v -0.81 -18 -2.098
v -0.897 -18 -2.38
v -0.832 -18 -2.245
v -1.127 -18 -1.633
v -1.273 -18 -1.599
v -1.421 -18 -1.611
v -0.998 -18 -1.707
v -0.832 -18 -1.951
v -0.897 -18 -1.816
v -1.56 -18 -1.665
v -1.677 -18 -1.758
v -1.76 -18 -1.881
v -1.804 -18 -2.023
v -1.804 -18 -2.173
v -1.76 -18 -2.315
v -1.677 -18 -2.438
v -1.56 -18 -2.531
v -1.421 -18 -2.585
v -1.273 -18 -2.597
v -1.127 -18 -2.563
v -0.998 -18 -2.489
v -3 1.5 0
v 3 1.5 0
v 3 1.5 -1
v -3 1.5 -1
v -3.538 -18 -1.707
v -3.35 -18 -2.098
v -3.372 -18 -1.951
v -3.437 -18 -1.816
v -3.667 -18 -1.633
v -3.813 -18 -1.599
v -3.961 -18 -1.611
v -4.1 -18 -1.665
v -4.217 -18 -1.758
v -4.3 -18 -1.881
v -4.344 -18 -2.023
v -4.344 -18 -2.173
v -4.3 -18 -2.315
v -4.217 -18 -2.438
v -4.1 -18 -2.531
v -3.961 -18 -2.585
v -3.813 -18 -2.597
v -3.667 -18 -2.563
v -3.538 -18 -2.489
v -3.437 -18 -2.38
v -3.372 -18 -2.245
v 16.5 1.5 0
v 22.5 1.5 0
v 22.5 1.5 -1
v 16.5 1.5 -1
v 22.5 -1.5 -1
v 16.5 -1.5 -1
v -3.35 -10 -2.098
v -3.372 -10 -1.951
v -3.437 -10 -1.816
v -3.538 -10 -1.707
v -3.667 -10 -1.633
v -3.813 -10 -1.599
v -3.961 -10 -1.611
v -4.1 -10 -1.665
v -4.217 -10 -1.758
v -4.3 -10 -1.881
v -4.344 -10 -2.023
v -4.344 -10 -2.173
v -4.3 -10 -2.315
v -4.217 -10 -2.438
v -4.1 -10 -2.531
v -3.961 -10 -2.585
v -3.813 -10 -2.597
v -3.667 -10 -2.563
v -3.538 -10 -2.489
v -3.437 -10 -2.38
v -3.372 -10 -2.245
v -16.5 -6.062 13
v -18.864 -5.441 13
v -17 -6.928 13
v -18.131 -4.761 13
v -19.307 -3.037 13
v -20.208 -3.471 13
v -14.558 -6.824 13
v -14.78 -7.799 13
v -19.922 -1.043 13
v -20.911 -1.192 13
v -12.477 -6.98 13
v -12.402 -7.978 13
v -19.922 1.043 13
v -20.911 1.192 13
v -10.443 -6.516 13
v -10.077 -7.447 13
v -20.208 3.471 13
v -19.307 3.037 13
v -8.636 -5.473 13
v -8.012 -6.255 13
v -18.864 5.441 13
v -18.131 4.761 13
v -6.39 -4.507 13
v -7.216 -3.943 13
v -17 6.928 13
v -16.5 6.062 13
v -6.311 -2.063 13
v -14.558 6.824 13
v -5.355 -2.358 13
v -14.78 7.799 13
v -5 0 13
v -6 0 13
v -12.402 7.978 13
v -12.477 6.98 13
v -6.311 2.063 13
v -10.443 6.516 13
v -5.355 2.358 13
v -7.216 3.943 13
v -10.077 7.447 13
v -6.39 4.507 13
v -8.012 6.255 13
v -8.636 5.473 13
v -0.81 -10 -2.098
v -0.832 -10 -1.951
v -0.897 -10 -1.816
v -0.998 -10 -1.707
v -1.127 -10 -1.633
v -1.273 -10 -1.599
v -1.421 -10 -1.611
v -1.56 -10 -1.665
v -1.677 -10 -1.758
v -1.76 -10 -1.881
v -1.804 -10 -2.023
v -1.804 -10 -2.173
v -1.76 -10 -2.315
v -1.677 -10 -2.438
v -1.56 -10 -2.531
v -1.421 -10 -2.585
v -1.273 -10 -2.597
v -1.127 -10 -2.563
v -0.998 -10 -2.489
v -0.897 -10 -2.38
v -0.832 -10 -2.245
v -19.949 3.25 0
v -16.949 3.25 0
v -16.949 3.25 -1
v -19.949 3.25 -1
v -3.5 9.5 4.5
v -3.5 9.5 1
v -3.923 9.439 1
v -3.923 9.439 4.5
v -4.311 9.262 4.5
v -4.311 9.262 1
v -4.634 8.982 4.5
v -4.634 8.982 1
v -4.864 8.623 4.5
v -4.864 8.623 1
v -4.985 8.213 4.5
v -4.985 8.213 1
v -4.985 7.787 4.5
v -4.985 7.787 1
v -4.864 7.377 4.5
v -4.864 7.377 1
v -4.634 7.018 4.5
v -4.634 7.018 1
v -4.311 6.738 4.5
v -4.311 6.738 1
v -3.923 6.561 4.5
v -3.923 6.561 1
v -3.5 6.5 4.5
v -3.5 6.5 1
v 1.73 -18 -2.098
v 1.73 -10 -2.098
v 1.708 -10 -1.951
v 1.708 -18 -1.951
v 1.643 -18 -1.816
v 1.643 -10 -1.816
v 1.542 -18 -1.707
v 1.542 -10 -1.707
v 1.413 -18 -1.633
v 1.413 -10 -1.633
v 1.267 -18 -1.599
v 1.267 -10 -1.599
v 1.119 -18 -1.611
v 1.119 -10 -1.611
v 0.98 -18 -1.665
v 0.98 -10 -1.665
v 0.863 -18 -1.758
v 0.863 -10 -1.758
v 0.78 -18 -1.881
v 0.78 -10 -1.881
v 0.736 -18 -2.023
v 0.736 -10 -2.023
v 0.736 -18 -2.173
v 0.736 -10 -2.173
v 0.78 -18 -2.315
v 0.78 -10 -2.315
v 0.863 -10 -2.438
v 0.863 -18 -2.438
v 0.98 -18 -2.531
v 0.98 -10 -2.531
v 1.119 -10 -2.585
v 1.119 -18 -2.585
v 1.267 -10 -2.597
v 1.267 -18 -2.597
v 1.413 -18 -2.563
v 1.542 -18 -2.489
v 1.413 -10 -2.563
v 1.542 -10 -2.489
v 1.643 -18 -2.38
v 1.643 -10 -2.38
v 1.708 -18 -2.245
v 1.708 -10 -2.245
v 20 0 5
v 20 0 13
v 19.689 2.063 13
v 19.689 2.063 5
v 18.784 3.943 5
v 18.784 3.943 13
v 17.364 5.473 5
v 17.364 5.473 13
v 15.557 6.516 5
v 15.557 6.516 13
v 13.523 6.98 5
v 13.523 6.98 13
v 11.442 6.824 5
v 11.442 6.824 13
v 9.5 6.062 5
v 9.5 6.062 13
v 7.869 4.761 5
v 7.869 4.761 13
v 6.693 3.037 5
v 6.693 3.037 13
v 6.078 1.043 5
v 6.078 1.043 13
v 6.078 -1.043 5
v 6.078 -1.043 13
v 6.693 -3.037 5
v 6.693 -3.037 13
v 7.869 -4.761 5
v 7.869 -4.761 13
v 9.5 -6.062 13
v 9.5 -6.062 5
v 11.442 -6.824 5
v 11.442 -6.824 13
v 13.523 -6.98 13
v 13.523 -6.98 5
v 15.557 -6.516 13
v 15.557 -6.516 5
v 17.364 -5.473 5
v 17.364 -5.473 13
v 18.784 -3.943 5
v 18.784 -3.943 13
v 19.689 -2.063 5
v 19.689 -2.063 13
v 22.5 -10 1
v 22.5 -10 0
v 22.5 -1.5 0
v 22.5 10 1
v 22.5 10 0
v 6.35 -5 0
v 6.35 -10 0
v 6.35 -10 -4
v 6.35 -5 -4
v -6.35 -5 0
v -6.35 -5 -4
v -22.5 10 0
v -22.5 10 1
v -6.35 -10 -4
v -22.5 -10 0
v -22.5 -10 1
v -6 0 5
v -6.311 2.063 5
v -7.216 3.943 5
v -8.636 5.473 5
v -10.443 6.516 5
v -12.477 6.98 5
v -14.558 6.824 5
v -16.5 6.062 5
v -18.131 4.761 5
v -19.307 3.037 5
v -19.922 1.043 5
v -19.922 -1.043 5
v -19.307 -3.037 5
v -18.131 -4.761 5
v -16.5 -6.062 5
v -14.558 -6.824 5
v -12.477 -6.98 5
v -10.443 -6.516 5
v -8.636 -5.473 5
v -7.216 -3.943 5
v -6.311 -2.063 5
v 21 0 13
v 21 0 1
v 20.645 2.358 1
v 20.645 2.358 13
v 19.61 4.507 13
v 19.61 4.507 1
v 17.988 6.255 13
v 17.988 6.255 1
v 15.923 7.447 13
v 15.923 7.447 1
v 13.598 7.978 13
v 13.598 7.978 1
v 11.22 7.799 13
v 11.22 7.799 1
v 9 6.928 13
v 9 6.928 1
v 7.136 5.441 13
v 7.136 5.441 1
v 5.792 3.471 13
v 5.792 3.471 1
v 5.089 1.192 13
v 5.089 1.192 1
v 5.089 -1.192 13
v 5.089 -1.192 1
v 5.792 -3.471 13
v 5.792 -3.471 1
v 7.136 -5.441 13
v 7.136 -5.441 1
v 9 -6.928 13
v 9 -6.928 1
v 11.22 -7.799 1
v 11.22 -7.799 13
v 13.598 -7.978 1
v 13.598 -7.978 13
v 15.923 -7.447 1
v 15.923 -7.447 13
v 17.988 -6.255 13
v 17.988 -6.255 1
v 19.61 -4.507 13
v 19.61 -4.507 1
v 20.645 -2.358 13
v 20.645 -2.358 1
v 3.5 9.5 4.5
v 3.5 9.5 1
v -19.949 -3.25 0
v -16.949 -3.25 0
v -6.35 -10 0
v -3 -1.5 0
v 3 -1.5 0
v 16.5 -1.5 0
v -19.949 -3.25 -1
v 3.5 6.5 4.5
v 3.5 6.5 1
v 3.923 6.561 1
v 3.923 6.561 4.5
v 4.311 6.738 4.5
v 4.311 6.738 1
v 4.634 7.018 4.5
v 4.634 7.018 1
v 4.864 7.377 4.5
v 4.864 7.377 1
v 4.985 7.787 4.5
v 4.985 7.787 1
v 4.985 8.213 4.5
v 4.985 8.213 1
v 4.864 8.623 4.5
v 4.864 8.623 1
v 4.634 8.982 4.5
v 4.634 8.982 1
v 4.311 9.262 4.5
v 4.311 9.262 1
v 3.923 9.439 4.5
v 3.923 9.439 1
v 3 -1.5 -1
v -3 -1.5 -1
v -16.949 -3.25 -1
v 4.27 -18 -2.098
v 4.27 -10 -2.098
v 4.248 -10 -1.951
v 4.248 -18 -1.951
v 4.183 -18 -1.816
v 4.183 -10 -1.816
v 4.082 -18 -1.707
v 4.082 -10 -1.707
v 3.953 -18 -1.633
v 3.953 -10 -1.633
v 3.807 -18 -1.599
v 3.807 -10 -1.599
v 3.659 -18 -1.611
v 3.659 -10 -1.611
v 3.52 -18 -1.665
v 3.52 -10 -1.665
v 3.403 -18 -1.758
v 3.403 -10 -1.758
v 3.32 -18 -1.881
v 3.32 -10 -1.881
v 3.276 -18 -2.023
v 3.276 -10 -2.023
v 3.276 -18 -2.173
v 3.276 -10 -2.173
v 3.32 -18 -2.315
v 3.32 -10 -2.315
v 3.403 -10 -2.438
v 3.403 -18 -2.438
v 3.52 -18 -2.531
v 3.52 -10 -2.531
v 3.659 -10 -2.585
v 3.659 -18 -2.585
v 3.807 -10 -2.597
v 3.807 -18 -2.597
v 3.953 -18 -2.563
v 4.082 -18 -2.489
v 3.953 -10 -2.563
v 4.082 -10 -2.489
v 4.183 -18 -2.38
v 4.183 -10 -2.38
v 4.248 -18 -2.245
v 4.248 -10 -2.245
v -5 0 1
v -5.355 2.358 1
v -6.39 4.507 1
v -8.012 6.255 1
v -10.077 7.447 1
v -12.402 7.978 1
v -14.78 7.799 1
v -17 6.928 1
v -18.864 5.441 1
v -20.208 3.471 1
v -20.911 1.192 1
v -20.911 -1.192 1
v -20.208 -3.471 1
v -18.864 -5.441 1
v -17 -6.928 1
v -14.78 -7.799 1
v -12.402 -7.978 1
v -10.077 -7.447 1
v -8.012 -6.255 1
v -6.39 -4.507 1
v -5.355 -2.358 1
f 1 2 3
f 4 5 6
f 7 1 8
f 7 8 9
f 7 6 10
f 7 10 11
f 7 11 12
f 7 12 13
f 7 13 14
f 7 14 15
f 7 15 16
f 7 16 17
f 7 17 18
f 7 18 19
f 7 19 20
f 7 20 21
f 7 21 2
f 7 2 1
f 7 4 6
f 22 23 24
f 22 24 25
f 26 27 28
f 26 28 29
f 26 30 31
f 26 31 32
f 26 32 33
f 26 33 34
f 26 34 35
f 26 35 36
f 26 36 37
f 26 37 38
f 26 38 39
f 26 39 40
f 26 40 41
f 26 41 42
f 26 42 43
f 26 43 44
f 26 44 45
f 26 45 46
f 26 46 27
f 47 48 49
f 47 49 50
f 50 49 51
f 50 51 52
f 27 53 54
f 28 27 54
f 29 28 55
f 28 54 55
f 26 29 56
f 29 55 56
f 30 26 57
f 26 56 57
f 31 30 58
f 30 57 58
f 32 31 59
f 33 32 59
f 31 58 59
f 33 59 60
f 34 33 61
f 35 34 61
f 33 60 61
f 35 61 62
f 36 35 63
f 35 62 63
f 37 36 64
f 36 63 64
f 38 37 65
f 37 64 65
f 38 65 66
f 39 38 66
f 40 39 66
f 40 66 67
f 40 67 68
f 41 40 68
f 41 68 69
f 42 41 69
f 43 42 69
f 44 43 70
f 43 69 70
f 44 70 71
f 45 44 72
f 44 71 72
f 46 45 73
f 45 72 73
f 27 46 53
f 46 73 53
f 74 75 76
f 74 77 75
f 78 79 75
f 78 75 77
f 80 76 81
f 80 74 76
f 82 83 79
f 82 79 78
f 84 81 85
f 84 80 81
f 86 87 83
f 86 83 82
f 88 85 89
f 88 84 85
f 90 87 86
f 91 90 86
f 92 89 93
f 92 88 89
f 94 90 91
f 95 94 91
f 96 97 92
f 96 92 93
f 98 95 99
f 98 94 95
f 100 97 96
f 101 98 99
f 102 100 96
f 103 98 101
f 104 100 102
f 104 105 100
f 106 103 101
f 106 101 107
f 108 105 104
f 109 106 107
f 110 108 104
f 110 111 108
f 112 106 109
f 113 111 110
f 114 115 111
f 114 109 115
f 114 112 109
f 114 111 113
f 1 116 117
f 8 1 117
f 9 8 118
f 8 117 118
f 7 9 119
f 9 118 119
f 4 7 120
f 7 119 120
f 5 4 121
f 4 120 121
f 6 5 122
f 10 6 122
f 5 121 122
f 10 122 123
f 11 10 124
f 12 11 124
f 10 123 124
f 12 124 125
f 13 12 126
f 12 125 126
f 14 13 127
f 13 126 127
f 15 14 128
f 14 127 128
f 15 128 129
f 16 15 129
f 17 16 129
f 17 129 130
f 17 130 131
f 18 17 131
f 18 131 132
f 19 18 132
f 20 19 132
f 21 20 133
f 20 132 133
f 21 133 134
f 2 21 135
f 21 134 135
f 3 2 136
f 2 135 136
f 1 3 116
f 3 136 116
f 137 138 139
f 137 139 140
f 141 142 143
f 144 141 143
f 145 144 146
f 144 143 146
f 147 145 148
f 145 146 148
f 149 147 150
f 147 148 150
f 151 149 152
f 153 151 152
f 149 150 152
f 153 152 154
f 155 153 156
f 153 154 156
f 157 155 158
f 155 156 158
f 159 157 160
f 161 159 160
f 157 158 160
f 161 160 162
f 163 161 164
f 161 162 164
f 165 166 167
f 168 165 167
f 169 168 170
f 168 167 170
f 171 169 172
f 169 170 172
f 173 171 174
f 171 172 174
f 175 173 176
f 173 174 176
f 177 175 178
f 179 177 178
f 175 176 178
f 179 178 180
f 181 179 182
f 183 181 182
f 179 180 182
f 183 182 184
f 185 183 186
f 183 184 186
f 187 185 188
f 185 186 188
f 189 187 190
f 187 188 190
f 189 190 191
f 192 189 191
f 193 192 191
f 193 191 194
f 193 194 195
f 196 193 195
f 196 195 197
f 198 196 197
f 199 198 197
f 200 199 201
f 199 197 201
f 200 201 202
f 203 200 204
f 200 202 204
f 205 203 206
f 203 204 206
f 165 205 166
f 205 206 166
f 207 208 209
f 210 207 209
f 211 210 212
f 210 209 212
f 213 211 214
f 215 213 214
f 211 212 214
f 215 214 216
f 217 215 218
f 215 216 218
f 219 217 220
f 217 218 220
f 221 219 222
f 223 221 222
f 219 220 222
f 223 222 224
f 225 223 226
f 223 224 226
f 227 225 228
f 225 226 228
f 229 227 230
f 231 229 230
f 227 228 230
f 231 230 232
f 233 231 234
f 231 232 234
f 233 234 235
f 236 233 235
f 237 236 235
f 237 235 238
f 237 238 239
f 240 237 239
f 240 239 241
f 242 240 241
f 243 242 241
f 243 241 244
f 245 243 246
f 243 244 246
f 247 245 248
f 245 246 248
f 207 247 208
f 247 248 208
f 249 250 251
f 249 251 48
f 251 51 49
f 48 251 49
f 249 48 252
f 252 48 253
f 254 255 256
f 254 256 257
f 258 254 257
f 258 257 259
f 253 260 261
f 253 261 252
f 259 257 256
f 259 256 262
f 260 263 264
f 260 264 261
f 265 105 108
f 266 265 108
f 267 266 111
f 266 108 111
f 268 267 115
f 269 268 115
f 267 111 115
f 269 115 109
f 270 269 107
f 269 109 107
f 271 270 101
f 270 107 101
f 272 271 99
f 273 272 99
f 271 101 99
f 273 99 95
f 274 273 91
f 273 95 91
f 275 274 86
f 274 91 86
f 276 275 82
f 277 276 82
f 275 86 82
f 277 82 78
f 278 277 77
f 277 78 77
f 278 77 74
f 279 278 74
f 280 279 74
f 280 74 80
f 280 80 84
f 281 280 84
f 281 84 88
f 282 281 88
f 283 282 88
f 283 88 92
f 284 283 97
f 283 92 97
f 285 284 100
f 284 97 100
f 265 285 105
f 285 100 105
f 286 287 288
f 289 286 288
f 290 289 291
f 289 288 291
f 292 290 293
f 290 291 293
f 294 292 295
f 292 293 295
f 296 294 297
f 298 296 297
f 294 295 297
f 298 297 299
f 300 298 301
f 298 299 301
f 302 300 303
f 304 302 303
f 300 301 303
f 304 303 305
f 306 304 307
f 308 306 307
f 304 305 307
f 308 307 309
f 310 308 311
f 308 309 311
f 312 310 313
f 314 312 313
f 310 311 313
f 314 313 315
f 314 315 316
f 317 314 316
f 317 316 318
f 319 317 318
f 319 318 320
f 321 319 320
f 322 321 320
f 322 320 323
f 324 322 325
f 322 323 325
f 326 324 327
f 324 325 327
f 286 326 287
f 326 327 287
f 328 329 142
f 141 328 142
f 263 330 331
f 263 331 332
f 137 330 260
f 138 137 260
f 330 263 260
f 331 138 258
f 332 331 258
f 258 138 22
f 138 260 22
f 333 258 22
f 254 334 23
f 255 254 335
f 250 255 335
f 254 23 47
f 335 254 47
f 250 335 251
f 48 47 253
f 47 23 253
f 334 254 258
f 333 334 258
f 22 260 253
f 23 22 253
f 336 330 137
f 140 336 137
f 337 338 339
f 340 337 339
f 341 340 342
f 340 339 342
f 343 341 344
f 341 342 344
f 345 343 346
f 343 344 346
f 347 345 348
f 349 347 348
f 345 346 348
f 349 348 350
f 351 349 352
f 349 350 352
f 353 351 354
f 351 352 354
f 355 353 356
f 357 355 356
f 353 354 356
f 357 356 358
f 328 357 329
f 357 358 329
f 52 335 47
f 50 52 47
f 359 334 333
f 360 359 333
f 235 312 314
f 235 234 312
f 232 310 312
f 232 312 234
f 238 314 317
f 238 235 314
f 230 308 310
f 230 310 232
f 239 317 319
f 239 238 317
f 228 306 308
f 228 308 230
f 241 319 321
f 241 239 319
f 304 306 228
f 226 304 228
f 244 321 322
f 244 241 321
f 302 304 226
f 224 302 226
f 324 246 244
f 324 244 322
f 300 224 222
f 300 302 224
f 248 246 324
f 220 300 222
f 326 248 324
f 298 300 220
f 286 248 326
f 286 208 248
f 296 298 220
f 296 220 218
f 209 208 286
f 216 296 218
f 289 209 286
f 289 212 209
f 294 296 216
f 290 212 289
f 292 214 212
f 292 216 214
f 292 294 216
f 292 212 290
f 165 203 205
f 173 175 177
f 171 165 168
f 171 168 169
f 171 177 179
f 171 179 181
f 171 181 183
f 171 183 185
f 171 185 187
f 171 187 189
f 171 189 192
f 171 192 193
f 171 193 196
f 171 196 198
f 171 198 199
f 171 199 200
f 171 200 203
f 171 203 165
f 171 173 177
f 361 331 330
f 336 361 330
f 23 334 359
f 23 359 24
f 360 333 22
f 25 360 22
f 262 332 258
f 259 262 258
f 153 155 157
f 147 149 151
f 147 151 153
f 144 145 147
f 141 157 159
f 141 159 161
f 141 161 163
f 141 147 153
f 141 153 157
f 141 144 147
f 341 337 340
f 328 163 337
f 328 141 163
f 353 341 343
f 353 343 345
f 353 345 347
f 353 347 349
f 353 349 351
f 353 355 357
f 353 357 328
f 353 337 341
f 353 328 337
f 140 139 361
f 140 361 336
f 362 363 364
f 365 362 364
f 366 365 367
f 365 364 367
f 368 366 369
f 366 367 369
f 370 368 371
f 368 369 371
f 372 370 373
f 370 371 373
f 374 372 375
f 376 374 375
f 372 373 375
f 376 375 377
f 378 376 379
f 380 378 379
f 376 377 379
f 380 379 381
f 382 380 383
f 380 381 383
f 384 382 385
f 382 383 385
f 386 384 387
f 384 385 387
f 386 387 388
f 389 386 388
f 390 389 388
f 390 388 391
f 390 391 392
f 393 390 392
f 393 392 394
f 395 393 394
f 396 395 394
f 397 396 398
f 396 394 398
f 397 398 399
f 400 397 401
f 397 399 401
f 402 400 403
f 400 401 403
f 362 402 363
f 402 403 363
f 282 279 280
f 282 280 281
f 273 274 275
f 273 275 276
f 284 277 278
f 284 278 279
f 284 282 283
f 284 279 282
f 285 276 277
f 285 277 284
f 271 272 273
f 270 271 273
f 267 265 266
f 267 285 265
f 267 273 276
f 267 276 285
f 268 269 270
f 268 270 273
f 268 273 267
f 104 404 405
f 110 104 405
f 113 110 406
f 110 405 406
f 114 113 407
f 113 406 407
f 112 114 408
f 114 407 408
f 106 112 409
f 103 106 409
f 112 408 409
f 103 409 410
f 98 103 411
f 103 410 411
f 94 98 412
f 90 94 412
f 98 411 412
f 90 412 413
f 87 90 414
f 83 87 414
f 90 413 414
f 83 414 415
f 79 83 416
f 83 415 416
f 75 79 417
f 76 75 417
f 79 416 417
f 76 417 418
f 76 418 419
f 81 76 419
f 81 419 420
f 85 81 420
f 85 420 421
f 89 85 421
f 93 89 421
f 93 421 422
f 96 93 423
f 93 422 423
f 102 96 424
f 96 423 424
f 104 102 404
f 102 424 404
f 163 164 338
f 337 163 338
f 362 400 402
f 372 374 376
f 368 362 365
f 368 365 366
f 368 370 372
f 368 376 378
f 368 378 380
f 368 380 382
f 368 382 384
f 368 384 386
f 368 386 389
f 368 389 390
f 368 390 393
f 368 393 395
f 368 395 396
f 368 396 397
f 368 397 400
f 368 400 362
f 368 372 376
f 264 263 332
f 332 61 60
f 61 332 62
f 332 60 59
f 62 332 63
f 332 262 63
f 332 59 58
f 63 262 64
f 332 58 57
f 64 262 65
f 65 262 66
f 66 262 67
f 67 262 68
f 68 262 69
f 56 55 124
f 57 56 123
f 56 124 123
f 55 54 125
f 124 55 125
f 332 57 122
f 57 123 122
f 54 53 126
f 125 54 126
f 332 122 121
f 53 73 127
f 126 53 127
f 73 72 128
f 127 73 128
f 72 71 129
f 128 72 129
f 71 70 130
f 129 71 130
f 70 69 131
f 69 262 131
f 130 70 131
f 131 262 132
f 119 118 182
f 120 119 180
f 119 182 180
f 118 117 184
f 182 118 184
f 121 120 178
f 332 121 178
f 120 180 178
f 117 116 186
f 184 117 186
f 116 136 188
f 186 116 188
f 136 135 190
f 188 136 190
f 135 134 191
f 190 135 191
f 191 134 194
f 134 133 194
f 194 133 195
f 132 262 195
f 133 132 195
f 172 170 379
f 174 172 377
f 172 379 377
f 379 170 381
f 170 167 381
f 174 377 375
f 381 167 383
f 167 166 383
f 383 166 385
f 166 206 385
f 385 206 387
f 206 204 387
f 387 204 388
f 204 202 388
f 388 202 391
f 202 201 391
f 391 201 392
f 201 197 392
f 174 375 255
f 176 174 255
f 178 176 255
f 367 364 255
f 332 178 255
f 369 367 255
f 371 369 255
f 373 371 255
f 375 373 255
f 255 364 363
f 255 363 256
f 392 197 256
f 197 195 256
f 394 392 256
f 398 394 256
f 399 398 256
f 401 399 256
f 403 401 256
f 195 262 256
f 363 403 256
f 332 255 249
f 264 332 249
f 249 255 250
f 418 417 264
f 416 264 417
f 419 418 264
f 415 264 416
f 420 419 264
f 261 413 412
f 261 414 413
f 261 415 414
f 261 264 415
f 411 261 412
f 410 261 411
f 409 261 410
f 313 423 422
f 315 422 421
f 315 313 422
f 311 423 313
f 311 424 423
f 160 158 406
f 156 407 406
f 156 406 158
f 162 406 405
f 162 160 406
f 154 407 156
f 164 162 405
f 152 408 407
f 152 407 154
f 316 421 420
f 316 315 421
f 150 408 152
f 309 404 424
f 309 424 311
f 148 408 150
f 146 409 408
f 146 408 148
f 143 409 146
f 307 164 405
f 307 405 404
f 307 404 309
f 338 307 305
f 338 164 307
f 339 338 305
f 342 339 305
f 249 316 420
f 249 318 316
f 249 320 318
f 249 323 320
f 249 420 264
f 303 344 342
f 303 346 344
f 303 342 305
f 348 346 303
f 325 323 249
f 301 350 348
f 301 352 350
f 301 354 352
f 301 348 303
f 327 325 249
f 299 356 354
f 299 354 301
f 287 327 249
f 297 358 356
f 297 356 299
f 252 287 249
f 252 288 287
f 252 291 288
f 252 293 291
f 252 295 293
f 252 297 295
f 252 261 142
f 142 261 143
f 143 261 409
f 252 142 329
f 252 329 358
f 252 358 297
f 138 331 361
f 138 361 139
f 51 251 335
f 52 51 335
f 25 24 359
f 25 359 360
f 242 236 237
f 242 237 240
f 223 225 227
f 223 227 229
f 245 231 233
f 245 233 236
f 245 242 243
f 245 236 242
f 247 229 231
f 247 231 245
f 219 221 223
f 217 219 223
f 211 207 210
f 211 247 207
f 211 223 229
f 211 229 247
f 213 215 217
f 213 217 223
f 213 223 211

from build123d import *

# Parameters (mm, degrees)
SKETCH1_W           = 45
SKETCH1_H           = 20
BOSS_EXTRUDE1_DEPTH = 1
SKETCH2_R           = 8
BOSS_EXTRUDE2_DEPTH = 12
BOSS_EXTRUDE4_DEPTH = 3.5
SKETCH4_R           = 7
CUT_EXTRUDE1_DEPTH  = 8
SKETCH8_W           = 6
SKETCH8_H           = 3
SKETCH8_W_2         = 3
SKETCH8_H_2         = 6.5
BOSS_EXTRUDE5_DEPTH = 1
SKETCH9_W           = 12.7
SKETCH9_H           = 5
BOSS_EXTRUDE6_DEPTH = 4
SKETCH10_R          = 0.5
BOSS_EXTRUDE7_DEPTH = 8


with BuildPart() as part:
    # Sketch1 → Boss-Extrude1 (new body)
    with BuildSketch(Plane.XY):
        Rectangle(SKETCH1_W, SKETCH1_H)
    extrude(amount=BOSS_EXTRUDE1_DEPTH)

    # Sketch2 → Boss-Extrude2 (add)
    with BuildSketch(Plane.XY.offset(1)):
        with Locations((13, 0)):
            Circle(SKETCH2_R)
        with Locations((-13, 0)):
            Circle(SKETCH2_R)
    extrude(amount=BOSS_EXTRUDE2_DEPTH)

    # Sketch3 → Boss-Extrude4 (add)
    with BuildSketch(Plane.XY.offset(1)):
        with BuildLine():
            Line((-3.5, 6.5), (3.5, 6.5))
            ThreePointArc((3.5, 6.5), (5, 8), (3.5, 9.5))
            Line((3.5, 9.5), (-3.5, 9.5))
            ThreePointArc((-3.5, 9.5), (-5, 8), (-3.5, 6.5))
        make_face()
    extrude(amount=BOSS_EXTRUDE4_DEPTH)

    # Sketch4 → Cut-Extrude1 (cut)
    with BuildSketch(Plane.XY.offset(13)):
        with Locations((-13, 0)):
            Circle(SKETCH4_R)
        with Locations((13, 0)):
            Circle(SKETCH4_R)
    extrude(amount=-CUT_EXTRUDE1_DEPTH, mode=Mode.SUBTRACT)

    # Sketch8 → Boss-Extrude5 (add)
    with BuildSketch(Plane(origin=(0, 0, 0), x_dir=(-1, 0, 0), z_dir=(0, 0, -1))):
        Rectangle(SKETCH8_W, SKETCH8_H)
        with Locations((-19.5, 0)):
            Rectangle(SKETCH8_W, SKETCH8_H)
        with Locations((18.449397774, 0)):
            Rectangle(SKETCH8_W_2, SKETCH8_H_2)
    extrude(amount=BOSS_EXTRUDE5_DEPTH)

    # Sketch9 → Boss-Extrude6 (add)
    with BuildSketch(Plane(origin=(0, 0, 0), x_dir=(-1, 0, 0), z_dir=(0, 0, -1))):
        with Locations((0, -7.5)):
            Rectangle(SKETCH9_W, SKETCH9_H)
    extrude(amount=BOSS_EXTRUDE6_DEPTH)

    # Sketch10 → Boss-Extrude7 (add)
    with BuildSketch(Plane.XZ.offset(10)):
        with Locations((-3.85, -2.098004041)):
            Circle(SKETCH10_R)
        with Locations((-1.31, -2.098004041)):
            Circle(SKETCH10_R)
        with Locations((1.23, -2.098004041)):
            Circle(SKETCH10_R)
        with Locations((3.77, -2.098004041)):
            Circle(SKETCH10_R)
    extrude(amount=BOSS_EXTRUDE7_DEPTH)


solid = part.part
